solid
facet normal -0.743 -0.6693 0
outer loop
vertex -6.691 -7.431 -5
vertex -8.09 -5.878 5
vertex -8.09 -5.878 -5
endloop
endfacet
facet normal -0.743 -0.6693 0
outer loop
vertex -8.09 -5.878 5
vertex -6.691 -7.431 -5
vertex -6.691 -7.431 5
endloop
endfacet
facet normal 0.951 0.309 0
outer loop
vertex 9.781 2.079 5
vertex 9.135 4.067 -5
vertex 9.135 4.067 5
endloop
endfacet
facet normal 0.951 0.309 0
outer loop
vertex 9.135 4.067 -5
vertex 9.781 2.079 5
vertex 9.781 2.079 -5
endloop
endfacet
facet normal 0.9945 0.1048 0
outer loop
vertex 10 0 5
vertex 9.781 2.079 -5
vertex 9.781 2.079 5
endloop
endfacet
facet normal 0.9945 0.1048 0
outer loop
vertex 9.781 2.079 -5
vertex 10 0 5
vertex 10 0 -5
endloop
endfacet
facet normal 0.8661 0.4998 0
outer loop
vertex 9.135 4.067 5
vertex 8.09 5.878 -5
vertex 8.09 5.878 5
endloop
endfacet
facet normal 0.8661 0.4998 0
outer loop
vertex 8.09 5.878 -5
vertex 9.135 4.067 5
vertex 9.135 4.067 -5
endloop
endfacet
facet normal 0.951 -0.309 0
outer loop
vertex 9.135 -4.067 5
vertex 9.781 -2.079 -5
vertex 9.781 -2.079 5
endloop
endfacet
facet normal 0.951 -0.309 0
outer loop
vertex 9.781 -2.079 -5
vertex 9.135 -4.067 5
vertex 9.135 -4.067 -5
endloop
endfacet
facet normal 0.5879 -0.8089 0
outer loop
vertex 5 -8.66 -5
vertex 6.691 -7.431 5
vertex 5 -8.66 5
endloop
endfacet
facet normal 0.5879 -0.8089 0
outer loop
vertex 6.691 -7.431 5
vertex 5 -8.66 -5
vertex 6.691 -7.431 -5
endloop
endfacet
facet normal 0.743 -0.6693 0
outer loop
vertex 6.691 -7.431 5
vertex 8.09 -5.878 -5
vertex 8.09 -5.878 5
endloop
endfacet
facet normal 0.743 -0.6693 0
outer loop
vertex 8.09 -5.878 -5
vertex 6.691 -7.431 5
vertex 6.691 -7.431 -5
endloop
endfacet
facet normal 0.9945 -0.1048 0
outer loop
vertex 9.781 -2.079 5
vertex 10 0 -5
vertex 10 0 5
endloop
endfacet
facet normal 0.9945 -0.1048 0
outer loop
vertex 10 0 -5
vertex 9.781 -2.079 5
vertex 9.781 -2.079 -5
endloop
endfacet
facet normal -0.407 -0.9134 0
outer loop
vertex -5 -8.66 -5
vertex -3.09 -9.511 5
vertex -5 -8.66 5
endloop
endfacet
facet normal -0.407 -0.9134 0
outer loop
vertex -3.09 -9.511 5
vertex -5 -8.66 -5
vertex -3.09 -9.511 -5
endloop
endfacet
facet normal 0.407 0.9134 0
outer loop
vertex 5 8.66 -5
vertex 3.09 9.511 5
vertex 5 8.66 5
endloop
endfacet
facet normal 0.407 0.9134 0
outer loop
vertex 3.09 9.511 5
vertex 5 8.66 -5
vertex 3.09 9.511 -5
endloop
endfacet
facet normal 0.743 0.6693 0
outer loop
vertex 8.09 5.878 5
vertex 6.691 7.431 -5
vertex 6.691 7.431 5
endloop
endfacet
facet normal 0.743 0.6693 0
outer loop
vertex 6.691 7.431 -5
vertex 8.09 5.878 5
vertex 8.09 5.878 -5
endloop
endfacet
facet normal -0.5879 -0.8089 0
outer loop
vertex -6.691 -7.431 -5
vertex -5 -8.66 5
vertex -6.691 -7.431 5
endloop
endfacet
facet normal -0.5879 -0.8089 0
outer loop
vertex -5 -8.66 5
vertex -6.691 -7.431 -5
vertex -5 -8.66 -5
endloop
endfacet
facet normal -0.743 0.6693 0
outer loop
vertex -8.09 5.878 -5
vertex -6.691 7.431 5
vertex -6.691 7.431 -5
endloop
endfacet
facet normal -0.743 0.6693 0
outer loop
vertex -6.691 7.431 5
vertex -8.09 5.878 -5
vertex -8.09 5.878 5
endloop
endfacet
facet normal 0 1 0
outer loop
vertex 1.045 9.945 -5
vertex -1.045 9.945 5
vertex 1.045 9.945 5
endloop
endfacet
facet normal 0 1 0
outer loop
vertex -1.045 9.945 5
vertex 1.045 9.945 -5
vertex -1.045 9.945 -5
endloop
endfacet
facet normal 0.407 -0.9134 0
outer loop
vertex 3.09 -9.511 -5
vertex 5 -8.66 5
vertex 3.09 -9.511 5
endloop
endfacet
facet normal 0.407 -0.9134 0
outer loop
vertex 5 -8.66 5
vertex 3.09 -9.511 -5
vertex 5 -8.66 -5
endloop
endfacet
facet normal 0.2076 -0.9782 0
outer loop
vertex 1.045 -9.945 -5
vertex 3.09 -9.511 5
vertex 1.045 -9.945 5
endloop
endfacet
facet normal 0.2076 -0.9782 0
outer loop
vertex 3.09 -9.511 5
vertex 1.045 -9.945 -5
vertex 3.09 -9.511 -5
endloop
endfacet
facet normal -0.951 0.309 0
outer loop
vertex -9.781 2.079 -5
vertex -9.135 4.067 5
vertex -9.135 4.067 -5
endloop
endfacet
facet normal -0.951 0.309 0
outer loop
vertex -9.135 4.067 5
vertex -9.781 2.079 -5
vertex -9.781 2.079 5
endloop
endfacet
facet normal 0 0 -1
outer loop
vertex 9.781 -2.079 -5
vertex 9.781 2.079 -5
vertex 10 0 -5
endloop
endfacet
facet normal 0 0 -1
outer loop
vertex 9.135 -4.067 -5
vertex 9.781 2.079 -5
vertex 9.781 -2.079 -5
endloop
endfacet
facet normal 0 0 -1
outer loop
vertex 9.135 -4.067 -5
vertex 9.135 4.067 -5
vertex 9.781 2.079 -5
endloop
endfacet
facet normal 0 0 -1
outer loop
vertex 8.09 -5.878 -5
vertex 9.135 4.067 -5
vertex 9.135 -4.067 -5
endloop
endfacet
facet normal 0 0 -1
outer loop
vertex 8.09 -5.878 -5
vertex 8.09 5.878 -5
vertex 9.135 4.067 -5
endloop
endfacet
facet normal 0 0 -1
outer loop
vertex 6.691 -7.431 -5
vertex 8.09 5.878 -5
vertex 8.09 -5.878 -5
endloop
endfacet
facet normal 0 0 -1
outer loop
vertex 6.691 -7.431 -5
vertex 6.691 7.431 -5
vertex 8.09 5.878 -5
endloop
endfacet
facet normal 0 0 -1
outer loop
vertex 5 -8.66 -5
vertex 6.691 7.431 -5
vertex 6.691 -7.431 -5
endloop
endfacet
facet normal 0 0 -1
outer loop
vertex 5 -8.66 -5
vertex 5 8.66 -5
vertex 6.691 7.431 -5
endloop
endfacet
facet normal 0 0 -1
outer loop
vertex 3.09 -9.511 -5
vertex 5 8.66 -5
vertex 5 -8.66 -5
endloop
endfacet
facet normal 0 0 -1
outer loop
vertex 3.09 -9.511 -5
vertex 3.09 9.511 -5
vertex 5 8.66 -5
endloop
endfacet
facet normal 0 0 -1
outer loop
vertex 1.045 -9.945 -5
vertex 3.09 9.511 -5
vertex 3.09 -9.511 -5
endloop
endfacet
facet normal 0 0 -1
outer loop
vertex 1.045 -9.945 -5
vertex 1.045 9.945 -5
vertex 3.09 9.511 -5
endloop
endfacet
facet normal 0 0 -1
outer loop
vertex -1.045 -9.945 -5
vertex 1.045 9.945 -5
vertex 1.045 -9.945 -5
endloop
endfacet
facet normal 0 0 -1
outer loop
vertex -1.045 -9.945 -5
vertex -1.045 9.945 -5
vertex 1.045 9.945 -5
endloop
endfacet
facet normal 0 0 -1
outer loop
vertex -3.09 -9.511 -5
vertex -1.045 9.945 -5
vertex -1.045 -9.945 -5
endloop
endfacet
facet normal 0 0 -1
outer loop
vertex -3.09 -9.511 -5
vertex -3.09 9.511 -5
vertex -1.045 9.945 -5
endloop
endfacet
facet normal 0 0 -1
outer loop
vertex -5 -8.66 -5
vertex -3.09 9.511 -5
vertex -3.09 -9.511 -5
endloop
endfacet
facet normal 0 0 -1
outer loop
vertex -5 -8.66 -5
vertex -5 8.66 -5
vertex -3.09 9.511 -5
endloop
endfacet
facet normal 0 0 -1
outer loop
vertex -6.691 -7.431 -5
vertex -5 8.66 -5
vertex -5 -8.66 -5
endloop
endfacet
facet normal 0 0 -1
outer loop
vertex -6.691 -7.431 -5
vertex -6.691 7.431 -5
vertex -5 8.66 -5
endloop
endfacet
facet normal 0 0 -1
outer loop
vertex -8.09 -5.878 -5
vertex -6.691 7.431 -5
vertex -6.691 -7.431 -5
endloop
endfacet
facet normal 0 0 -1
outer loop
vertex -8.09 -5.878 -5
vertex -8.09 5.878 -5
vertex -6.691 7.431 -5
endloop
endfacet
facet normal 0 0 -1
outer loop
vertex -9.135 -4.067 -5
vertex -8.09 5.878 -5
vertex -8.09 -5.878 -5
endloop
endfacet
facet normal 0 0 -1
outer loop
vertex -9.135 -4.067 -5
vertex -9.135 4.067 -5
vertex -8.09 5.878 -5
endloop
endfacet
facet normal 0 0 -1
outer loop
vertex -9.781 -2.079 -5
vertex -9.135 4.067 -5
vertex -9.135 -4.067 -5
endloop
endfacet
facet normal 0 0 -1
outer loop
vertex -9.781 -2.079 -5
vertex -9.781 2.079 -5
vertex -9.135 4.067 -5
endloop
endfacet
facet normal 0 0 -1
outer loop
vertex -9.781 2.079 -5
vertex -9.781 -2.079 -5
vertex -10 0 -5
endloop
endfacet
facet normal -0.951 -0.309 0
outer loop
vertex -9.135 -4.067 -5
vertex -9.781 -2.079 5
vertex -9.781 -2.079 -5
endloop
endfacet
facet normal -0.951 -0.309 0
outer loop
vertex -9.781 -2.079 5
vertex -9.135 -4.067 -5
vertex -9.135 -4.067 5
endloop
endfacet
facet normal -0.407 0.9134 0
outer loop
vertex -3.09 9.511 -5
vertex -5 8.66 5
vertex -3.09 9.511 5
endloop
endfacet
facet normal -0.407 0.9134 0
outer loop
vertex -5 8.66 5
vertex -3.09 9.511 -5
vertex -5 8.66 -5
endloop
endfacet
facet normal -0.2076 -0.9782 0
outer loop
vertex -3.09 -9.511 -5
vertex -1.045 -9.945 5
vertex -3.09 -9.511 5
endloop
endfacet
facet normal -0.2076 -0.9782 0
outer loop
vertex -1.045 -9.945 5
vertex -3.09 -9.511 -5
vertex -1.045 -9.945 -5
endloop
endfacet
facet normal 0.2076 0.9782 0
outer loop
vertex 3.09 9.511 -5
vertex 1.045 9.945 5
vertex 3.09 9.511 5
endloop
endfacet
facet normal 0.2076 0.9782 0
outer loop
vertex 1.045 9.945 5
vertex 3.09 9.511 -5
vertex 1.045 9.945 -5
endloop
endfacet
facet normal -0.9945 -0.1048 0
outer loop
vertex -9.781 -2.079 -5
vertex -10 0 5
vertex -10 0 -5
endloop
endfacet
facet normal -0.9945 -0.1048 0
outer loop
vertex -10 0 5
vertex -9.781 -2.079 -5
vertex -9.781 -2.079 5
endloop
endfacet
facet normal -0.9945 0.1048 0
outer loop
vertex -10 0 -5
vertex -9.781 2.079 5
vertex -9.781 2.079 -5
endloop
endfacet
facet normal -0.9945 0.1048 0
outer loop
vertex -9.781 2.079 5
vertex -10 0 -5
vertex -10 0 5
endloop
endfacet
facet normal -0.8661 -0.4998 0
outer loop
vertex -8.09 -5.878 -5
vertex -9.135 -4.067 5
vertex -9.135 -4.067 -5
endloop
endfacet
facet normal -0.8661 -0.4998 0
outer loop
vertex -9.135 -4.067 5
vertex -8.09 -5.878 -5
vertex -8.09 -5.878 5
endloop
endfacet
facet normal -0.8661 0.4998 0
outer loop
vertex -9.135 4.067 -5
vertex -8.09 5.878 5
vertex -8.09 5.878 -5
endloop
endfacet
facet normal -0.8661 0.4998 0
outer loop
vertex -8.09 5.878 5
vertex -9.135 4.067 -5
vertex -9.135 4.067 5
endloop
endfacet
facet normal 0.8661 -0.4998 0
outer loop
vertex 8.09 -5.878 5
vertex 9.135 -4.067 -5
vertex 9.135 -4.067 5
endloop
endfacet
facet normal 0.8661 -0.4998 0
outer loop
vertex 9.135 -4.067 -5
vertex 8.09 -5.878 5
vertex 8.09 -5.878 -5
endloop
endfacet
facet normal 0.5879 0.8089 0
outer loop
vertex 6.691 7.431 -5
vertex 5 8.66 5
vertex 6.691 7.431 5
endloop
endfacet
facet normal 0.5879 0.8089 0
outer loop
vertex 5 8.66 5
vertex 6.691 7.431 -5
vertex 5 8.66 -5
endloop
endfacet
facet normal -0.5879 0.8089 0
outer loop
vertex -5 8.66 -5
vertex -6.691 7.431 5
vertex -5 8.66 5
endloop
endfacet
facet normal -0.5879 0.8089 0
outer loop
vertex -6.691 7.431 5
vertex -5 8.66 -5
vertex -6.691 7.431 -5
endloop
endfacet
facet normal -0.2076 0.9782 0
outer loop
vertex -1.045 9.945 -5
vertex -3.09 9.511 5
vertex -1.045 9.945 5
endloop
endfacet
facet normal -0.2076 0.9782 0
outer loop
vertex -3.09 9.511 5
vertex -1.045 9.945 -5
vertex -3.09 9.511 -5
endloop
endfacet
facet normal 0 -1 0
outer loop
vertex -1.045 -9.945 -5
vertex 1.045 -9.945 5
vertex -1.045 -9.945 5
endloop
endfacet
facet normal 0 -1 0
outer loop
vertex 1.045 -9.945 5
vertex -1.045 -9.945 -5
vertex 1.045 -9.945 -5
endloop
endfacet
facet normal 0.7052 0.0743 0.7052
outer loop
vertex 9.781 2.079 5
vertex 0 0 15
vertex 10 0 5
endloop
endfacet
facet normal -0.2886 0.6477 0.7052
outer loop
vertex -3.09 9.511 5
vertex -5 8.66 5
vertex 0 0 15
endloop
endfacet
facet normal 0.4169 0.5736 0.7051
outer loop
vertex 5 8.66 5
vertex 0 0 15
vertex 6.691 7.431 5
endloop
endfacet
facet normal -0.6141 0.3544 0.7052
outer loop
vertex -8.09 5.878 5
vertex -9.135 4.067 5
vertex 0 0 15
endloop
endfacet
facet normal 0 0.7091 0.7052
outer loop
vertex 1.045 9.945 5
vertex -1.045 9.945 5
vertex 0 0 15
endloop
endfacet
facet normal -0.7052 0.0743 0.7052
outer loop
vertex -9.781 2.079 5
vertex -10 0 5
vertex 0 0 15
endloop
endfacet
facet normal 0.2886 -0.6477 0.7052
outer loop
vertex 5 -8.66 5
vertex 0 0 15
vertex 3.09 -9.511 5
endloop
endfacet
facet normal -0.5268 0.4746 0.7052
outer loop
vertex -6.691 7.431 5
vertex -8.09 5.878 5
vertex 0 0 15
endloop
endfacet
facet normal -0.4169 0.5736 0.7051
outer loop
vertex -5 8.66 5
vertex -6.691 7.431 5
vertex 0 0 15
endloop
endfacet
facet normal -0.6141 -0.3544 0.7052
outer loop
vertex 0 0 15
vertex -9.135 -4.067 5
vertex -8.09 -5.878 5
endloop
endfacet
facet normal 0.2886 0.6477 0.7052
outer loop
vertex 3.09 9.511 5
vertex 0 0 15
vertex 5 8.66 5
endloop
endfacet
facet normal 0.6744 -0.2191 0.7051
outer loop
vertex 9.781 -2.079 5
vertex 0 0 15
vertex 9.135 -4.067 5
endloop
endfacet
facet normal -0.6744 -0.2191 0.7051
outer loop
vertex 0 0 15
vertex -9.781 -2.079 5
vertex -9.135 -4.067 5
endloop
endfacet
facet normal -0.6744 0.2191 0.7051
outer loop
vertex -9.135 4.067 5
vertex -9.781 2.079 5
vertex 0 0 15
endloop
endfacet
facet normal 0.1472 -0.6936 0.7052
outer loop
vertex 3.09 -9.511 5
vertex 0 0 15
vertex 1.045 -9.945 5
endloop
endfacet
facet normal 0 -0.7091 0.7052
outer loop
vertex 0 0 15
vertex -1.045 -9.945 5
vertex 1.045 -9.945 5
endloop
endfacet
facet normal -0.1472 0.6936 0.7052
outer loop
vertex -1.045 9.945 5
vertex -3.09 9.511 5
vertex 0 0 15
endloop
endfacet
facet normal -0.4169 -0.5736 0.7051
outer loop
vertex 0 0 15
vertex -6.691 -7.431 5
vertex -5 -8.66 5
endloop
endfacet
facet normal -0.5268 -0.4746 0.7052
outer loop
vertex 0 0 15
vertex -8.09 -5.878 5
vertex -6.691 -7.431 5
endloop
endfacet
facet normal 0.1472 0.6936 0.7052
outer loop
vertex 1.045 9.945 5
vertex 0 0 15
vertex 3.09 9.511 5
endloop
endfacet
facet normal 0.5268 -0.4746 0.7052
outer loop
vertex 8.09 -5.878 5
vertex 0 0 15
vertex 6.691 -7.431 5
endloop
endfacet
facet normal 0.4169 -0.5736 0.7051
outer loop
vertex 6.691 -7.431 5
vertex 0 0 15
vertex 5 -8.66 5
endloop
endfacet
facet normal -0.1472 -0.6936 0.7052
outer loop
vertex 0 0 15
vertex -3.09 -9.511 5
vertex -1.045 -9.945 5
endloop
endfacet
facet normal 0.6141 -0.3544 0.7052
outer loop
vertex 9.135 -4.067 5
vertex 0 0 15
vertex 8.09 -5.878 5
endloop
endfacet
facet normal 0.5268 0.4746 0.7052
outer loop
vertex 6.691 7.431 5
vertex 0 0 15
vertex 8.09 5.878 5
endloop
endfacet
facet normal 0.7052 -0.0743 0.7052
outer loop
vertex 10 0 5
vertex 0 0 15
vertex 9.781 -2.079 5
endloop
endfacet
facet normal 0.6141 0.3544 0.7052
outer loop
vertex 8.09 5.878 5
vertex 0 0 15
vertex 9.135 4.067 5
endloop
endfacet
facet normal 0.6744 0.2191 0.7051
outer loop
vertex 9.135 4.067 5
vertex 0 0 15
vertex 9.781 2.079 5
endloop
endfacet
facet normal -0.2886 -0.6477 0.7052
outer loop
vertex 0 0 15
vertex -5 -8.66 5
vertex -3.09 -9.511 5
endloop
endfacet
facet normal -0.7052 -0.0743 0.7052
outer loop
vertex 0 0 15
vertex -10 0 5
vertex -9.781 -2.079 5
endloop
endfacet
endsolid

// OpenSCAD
// Generated by SolidPython 0.4.0 on 2019-09-03 12:41:30


union() {
	cylinder(center = true, h = 10, r = 10);
	translate(v = [0, 0, 5]) {
		cylinder(h = 10, r1 = 10, r2 = 0);
	}
}
/***********************************************
*********      SolidPython code:      **********
************************************************
 
#! /usr/bin/env python
# -*- coding: utf-8 -*-
import os
import sys

from solid import *
from solid.utils import *

SEGMENTS = 48


def show_appended_python_code():
    a = cylinder(r=10, h=10, center=True) + up(5)(cylinder(r1=10, r2=0, h=10))

    return a

if __name__ == '__main__':
    out_dir = sys.argv[1] if len(sys.argv) > 1 else os.curdir
    file_out = os.path.join(out_dir, 'append_solidpython_code.scad')

    a = show_appended_python_code()

    print("%(__file__)s: SCAD file written to: \n%(file_out)s" % vars())
    # ================================================================
    # = include_orig_code appends all python code as comments to the
    # = bottom of the generated OpenSCAD code, so the final document
    # = contains the easy-to-read python code as well as the SCAD.
    # = ------------------------------------------------------------ =
    scad_render_to_file(a, file_out,  include_orig_code=True)
 
 
************************************************/
